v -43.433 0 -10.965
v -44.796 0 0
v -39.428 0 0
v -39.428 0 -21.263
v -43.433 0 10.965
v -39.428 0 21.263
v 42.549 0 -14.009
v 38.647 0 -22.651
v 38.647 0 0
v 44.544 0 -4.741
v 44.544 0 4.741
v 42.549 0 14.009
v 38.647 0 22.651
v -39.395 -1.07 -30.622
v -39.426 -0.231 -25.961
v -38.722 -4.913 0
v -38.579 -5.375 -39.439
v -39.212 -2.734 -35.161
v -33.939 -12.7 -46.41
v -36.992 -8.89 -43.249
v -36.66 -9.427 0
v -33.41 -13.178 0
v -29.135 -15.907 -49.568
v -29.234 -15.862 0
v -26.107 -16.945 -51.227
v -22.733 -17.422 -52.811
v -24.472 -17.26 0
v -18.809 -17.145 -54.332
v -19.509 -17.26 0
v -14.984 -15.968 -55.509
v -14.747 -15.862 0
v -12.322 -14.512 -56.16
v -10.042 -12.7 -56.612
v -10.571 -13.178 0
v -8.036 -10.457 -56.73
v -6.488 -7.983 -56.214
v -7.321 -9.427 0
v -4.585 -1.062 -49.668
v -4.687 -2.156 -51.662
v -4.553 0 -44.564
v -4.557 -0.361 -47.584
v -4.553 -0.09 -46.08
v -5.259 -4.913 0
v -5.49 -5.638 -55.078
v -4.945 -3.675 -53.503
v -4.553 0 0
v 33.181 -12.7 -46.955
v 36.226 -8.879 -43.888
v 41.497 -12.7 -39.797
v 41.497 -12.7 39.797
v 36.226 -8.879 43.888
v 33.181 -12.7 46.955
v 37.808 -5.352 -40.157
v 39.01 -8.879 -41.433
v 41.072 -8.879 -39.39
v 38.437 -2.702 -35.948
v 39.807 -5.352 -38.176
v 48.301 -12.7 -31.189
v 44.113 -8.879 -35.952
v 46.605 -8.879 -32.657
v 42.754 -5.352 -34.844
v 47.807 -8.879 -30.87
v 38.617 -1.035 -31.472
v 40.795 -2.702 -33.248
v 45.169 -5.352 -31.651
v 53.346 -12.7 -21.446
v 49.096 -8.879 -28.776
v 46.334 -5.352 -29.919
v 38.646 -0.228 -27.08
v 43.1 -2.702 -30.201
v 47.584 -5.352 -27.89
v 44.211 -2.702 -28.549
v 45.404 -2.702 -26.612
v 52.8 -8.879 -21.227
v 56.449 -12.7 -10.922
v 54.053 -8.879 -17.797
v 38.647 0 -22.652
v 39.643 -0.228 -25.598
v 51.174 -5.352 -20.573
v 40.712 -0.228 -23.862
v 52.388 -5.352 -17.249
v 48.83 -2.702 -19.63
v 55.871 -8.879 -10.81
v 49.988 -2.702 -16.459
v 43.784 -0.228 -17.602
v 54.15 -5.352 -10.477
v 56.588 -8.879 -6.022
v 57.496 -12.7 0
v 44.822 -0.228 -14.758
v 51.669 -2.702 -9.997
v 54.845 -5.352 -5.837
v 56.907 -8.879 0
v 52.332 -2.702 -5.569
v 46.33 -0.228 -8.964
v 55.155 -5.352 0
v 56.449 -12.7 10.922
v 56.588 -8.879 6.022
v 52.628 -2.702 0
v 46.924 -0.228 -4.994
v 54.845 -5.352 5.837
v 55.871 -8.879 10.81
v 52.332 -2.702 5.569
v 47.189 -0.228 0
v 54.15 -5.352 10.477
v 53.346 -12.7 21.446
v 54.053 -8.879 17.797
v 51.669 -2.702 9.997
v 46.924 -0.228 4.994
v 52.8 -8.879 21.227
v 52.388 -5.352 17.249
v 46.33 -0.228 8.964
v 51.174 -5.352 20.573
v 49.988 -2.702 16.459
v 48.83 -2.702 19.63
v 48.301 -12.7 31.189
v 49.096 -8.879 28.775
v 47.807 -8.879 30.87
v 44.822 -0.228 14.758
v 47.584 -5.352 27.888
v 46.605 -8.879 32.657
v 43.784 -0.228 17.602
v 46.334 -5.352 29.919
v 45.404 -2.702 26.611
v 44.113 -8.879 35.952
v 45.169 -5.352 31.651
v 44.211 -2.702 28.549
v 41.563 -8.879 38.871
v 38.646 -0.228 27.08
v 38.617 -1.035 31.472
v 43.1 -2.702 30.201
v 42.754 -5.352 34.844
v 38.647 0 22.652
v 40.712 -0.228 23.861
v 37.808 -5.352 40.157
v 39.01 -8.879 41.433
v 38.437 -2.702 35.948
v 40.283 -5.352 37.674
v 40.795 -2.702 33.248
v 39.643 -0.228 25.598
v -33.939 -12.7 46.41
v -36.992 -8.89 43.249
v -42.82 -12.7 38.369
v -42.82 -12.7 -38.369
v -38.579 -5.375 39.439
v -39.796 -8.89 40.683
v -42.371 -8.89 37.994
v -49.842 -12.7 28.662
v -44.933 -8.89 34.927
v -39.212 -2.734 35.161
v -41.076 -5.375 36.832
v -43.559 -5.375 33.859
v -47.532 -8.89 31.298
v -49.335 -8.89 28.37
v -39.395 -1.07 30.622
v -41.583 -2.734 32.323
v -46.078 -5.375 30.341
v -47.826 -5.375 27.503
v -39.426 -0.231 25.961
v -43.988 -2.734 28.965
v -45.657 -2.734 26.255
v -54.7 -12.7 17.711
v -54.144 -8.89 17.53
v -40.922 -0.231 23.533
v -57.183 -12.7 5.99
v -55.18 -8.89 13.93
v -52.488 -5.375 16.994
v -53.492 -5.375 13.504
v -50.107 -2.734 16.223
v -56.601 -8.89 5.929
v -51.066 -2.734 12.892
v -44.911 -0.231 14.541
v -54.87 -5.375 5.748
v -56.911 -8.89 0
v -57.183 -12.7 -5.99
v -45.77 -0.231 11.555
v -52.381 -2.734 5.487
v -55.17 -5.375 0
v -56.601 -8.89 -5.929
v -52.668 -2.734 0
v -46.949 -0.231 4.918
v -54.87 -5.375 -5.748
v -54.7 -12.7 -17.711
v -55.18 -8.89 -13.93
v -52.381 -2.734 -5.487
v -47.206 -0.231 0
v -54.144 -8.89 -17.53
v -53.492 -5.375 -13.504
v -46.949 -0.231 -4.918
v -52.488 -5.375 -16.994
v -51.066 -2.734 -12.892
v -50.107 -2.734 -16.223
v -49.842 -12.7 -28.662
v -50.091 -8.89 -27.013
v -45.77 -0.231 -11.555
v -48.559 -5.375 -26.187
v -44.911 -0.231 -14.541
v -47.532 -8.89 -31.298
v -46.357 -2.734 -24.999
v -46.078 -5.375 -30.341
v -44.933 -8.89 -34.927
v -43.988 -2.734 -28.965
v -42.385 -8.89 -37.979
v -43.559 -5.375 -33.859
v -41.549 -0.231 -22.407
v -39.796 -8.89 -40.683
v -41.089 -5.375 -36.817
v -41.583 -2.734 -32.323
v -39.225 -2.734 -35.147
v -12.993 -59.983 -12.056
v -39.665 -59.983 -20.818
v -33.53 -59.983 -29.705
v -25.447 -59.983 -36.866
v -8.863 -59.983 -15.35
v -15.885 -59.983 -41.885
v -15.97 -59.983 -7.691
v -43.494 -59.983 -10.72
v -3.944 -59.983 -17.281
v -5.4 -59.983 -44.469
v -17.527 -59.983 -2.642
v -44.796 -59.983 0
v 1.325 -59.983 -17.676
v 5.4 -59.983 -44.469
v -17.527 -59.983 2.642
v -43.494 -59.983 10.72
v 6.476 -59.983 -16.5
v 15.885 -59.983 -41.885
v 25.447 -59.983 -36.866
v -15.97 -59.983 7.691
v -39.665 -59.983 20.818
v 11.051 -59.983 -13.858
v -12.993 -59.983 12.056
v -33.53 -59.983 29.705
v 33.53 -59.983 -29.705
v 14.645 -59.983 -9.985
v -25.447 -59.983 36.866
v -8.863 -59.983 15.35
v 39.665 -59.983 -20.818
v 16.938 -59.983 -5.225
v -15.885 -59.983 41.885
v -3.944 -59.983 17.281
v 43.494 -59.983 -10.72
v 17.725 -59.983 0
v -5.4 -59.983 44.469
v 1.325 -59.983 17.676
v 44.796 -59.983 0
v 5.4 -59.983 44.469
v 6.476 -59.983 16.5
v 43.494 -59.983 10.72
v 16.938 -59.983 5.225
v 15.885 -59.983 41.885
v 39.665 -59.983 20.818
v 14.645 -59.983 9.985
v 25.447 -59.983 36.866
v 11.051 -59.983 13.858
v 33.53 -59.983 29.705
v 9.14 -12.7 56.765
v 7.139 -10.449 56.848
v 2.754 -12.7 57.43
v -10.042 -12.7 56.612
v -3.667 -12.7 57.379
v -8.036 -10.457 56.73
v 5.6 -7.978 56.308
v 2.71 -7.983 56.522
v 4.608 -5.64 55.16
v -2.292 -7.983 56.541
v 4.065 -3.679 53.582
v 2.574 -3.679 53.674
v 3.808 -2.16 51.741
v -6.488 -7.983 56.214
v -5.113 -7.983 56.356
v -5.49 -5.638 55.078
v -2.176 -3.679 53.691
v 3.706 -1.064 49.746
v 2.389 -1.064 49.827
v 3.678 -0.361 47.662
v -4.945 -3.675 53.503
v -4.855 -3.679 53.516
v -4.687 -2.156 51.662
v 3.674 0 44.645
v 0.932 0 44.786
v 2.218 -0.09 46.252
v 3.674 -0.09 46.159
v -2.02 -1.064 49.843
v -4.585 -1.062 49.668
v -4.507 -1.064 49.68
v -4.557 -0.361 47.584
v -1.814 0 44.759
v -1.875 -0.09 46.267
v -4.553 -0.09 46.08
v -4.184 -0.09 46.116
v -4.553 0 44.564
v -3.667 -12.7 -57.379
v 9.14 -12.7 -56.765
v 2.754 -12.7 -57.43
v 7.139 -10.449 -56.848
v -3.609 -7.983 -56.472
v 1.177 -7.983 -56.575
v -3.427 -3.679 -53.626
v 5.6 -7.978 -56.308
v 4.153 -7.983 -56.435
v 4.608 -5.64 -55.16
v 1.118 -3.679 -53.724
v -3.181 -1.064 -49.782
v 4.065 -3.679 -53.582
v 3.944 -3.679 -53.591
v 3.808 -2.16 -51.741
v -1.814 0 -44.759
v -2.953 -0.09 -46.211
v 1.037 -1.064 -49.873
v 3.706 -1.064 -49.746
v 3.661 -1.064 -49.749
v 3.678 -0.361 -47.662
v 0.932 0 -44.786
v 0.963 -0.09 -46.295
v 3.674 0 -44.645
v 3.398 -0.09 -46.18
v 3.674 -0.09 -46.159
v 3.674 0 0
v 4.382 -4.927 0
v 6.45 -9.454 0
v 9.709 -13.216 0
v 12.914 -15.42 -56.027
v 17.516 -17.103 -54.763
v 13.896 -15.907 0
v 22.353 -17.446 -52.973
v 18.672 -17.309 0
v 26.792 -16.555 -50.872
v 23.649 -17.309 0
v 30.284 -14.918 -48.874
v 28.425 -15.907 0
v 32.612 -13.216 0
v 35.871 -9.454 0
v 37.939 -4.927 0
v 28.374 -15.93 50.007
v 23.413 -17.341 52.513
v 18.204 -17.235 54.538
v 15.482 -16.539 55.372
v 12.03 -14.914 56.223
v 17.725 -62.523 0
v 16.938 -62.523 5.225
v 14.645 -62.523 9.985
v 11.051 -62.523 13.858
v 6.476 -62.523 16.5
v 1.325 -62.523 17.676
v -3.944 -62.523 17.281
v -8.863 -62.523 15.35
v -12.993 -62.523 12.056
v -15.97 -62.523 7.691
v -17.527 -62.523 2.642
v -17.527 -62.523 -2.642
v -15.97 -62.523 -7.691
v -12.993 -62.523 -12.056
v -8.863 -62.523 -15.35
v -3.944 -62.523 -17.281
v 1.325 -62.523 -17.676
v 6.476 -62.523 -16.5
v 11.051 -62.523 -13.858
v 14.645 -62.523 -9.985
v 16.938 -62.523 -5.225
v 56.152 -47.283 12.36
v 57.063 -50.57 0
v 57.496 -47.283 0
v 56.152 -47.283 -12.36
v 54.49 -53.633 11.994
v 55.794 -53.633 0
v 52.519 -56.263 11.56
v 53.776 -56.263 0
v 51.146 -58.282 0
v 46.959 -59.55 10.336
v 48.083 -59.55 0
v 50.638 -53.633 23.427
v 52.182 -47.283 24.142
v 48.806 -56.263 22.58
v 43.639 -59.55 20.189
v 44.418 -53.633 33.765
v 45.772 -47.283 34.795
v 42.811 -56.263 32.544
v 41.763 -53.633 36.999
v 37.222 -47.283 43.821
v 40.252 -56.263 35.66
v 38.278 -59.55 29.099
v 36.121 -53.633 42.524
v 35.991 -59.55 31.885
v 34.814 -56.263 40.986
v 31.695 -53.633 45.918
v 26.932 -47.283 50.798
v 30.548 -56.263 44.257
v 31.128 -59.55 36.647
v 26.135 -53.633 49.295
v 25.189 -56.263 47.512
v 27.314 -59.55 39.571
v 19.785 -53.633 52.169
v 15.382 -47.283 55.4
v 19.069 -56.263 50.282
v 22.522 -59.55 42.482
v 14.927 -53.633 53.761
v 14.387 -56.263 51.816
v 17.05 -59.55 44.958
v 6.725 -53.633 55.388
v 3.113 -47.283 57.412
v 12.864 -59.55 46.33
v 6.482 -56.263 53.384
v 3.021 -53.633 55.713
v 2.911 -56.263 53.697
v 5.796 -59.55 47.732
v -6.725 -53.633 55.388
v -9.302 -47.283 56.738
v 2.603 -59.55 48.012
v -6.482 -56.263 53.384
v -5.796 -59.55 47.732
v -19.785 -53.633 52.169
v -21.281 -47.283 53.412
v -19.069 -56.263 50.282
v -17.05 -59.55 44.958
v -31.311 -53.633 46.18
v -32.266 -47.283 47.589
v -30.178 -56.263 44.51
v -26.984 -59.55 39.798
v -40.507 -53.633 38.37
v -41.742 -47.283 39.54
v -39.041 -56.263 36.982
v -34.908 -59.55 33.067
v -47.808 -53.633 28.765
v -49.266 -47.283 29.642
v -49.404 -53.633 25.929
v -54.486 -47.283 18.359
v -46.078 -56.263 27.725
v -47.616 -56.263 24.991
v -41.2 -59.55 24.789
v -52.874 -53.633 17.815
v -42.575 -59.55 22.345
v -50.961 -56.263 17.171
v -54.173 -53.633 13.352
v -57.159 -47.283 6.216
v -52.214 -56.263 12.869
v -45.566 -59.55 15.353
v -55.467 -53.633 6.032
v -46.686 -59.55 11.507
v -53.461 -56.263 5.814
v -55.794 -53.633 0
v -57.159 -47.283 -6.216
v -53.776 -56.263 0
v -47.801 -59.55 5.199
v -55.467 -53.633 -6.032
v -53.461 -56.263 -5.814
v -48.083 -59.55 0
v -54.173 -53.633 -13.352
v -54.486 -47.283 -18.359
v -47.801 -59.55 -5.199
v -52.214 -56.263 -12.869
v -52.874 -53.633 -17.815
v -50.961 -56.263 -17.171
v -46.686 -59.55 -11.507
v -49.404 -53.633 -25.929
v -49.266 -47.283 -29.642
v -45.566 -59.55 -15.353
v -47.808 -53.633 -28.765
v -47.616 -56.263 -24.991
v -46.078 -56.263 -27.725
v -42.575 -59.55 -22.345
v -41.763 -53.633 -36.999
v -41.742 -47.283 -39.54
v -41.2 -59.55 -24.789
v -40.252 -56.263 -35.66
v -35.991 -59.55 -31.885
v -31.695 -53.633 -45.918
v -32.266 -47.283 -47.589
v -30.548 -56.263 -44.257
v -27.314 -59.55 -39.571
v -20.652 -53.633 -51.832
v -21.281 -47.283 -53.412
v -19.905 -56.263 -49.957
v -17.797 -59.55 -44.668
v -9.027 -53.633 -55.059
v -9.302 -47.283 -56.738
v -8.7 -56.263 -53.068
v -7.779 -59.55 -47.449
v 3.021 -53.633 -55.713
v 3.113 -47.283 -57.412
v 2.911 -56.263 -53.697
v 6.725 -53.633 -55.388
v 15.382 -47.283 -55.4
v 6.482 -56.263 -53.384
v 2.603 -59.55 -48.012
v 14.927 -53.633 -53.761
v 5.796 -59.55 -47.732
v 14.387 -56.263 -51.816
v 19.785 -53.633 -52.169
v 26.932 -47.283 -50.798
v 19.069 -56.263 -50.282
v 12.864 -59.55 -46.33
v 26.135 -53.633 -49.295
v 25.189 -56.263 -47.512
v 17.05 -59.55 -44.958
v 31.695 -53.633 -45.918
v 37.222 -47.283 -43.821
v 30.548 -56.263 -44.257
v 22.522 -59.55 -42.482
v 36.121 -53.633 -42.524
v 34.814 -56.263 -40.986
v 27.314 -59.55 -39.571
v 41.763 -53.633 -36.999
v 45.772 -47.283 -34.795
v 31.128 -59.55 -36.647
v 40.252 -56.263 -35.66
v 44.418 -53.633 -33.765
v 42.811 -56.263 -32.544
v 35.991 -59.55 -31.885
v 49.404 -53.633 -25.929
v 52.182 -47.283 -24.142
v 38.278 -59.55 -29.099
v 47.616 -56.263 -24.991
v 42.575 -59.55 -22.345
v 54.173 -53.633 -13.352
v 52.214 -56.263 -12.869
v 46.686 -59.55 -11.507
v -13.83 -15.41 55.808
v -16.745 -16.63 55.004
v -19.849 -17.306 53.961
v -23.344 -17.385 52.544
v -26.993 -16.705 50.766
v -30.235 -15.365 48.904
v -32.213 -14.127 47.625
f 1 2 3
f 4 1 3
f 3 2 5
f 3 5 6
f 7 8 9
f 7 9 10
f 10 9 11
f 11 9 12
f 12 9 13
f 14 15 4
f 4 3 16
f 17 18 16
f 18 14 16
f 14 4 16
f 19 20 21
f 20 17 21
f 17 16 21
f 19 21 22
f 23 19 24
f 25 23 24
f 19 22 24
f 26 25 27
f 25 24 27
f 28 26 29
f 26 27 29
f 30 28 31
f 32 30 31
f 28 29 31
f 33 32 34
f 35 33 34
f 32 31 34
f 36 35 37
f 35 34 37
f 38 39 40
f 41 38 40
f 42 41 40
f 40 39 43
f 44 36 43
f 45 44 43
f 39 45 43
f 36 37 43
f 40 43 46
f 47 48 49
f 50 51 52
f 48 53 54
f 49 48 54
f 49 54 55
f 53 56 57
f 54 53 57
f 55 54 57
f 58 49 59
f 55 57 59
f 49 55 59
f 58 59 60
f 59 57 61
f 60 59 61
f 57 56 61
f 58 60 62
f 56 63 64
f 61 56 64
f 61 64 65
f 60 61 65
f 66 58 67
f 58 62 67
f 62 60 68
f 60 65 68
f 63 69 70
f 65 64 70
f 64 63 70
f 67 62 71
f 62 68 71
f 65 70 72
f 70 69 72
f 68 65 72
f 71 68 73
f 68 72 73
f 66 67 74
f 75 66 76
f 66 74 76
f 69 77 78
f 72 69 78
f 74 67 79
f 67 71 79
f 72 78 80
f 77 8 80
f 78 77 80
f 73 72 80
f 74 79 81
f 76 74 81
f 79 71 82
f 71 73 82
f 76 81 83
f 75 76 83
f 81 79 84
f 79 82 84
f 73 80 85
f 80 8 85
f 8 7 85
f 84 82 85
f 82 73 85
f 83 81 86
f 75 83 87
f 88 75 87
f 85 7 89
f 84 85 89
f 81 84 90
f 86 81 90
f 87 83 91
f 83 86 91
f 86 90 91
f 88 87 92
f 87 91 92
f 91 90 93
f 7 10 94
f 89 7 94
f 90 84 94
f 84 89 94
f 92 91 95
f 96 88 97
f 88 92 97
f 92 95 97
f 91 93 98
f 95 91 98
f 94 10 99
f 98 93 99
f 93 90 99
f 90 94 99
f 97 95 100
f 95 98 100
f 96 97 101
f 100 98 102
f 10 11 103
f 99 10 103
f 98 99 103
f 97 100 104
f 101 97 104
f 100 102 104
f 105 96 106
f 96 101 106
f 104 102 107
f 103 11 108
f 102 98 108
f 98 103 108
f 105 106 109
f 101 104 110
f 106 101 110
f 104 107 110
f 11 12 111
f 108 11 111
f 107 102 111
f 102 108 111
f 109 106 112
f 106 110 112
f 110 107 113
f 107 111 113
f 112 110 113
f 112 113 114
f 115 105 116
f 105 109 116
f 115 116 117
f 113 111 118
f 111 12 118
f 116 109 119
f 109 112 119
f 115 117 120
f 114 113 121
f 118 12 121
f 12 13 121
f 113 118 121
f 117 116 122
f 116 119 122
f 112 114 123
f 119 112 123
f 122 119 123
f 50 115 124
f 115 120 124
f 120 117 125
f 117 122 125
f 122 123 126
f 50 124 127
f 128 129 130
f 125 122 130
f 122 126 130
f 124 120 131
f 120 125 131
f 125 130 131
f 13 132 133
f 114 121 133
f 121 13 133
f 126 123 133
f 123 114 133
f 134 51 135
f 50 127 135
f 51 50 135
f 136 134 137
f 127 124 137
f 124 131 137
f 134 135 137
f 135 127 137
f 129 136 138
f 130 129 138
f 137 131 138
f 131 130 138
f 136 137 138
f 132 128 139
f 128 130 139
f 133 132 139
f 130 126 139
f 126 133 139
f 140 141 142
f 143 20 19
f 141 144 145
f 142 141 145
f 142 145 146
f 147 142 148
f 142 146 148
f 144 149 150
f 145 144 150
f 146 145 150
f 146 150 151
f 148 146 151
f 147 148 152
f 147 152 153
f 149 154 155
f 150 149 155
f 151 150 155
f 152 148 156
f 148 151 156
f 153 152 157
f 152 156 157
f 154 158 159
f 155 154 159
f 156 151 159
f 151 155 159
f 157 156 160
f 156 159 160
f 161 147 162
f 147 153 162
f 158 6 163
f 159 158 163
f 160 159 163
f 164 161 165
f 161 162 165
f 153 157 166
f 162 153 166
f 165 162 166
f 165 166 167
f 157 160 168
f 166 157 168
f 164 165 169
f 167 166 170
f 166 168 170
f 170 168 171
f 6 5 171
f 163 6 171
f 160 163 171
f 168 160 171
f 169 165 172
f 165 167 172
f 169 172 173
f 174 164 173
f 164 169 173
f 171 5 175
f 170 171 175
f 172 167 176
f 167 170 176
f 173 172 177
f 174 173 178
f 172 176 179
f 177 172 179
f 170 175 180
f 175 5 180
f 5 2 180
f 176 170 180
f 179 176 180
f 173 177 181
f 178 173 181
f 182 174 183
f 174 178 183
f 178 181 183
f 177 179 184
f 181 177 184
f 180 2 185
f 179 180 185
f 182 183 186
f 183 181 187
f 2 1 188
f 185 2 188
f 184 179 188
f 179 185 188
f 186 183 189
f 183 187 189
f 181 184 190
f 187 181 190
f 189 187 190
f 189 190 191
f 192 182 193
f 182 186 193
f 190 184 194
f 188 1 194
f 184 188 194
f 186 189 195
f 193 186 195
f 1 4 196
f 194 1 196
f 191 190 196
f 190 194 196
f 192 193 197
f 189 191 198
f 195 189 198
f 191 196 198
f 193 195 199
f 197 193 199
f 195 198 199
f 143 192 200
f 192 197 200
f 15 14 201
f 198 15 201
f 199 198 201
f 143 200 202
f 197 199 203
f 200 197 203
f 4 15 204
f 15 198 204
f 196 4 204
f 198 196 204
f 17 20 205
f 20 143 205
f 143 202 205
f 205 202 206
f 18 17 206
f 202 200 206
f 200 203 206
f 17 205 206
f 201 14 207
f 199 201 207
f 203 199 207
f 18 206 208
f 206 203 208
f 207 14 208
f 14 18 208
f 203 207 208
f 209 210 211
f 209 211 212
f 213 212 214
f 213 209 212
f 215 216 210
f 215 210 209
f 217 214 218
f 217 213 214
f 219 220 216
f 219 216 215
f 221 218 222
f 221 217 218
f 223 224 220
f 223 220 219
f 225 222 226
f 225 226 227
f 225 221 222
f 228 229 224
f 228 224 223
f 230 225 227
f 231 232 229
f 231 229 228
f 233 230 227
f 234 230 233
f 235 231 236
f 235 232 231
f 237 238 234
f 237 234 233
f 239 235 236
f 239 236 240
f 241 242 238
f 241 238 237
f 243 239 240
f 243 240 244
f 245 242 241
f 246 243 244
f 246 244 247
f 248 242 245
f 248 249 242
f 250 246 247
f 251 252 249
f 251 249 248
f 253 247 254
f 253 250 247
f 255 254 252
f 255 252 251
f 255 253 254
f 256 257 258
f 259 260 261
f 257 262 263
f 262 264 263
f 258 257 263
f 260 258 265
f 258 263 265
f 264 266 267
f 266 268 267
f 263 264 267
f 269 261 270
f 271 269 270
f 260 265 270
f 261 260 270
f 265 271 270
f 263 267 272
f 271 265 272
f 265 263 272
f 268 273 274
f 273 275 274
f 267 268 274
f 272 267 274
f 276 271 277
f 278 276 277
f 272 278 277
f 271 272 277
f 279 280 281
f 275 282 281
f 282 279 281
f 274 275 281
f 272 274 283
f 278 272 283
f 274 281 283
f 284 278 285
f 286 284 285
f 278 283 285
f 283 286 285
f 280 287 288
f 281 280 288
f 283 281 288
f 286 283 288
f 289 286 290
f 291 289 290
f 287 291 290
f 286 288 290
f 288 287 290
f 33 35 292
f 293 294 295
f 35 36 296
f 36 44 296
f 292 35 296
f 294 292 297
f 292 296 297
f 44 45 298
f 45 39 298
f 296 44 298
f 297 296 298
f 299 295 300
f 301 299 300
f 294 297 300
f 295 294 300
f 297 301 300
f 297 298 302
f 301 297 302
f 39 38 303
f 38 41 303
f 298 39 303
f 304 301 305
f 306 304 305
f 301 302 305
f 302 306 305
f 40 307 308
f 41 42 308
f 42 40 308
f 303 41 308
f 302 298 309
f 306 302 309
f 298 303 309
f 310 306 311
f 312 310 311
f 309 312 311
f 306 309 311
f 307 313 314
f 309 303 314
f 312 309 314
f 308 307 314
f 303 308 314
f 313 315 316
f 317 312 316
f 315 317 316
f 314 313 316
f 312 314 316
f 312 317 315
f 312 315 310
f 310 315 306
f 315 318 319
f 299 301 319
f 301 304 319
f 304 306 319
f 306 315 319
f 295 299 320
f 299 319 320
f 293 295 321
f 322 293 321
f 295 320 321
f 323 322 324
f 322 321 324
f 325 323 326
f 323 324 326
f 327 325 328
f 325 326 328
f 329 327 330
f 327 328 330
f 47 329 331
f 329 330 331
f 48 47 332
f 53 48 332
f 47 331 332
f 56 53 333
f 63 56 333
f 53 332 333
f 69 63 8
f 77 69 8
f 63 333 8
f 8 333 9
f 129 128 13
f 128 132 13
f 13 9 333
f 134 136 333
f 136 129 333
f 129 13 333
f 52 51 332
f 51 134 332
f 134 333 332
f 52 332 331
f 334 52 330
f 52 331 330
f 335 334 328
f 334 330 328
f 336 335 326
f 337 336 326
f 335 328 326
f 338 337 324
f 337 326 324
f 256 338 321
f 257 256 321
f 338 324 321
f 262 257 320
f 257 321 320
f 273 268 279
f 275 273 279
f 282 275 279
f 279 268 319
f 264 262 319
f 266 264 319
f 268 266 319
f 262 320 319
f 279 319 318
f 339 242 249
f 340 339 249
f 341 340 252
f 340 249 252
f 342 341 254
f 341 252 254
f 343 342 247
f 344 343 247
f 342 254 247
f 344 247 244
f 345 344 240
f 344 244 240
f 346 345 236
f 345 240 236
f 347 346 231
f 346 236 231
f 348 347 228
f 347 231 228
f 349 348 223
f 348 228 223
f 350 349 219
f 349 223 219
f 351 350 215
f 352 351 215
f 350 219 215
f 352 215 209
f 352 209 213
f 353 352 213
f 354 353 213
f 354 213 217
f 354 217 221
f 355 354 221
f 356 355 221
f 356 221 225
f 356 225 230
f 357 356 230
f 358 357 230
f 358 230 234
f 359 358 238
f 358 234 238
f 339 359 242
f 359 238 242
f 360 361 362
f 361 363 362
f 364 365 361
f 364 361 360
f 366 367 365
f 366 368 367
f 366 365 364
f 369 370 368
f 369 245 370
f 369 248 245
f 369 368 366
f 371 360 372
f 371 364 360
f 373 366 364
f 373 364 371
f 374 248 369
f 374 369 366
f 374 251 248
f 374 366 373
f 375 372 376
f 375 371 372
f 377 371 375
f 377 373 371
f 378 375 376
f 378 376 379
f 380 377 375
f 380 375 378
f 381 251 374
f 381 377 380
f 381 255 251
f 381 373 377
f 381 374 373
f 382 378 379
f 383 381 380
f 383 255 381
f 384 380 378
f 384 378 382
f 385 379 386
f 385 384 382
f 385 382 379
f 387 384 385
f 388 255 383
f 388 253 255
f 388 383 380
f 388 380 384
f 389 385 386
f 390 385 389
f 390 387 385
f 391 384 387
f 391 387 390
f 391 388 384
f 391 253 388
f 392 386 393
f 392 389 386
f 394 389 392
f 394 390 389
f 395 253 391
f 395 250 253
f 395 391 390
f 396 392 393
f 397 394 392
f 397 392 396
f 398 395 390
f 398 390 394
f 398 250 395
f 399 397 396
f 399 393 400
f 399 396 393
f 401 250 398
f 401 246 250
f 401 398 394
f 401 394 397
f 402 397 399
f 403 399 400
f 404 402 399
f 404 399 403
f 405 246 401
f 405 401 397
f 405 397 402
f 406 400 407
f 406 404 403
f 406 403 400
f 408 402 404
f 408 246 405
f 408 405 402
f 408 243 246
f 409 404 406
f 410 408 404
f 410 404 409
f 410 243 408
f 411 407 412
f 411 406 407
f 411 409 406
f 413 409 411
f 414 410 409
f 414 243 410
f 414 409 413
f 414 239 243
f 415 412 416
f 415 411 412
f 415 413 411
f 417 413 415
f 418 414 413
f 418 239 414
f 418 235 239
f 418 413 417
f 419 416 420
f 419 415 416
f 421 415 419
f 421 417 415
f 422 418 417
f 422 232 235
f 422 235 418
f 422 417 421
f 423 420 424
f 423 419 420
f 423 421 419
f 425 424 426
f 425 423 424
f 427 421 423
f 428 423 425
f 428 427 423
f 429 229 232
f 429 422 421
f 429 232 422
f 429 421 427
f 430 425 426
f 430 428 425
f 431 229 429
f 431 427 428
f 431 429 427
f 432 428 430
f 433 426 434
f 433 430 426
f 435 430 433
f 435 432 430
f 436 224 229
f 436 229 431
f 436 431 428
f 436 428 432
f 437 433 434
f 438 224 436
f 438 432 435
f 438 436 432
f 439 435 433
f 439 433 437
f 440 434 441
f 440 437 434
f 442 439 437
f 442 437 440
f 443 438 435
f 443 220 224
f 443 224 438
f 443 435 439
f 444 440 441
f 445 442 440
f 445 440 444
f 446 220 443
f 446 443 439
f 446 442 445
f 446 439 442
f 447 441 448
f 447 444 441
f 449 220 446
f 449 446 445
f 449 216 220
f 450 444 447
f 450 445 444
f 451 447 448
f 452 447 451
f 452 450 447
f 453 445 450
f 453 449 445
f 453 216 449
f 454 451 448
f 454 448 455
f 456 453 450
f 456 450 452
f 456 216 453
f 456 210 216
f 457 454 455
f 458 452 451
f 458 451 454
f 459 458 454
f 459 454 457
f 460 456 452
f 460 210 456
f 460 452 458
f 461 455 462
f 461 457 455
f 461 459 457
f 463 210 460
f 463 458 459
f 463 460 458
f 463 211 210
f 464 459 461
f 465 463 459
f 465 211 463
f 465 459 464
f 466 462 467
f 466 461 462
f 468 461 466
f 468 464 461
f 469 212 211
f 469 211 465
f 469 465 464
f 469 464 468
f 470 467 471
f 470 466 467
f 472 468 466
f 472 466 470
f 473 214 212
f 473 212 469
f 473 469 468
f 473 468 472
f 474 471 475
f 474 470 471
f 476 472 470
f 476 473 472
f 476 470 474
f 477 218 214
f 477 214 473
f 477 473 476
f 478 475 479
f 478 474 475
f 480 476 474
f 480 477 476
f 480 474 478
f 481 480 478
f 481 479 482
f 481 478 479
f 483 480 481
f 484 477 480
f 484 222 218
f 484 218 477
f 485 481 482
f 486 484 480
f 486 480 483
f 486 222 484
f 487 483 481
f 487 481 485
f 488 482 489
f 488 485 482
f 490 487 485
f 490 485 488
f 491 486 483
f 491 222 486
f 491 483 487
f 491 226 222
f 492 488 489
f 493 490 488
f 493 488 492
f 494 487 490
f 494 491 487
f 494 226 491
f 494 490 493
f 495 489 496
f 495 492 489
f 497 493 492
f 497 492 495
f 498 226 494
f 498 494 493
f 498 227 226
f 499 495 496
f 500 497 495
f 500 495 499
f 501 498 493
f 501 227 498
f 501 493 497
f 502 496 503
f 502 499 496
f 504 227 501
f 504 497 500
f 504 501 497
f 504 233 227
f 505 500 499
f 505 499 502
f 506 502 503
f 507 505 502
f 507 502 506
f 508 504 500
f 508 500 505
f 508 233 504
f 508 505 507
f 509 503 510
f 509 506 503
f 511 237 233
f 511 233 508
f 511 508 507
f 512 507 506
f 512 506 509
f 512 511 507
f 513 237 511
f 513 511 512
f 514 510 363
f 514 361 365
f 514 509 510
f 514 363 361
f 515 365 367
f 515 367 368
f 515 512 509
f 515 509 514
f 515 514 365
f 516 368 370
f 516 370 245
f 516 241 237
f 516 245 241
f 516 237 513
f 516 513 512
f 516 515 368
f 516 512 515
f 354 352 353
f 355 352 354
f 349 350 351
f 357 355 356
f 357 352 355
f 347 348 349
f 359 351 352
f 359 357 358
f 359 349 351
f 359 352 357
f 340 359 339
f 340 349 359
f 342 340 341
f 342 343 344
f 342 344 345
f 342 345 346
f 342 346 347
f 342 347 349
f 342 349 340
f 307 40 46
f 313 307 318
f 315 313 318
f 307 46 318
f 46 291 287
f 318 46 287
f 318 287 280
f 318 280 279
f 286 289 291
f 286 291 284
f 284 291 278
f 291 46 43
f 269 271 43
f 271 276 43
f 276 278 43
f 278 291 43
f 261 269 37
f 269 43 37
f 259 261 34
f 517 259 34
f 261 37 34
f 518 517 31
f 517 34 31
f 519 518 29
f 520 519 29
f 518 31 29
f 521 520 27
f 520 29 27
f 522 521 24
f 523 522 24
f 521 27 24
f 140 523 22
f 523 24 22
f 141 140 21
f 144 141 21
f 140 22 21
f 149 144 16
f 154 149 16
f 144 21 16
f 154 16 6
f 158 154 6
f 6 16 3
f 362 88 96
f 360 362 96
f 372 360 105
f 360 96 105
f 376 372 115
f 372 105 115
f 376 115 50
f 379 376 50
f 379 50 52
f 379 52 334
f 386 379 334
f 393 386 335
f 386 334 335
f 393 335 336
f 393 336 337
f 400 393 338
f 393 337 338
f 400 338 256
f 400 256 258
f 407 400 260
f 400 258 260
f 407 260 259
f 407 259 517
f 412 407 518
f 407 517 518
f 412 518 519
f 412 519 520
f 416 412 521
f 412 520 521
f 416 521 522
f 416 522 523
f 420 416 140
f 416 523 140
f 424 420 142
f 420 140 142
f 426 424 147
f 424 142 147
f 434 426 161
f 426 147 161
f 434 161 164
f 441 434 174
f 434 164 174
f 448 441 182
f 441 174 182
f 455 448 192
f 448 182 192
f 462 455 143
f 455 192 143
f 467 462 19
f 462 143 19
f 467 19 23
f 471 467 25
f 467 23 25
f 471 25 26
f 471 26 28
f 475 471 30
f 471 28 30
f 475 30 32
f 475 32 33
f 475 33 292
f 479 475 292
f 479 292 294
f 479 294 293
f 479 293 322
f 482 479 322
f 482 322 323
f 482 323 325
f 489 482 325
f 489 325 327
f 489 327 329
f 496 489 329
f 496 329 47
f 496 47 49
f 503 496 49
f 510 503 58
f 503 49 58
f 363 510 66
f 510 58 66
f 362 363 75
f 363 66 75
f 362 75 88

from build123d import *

# Parameters (mm, degrees)
F0_R      = 57.495906
F1_DEPTH  = 59.983172
F2_R      = 12.7
F3_R      = 12.7
F4_R      = 17.725116
F5_DEPTH  = 2.54
F6_R      = 17.48679
F8_DEPTH  = 68.421327
F7_R      = 17.437496
F9_DEPTH  = 79.699665
F11_DEPTH = 109.126121


with BuildPart() as f1:
    # F0 (on Front) → F1 (new body)
    with BuildSketch(Plane.XZ):
        Circle(F0_R)
    extrude(amount=F1_DEPTH)

    # F2
    f2_edges = [f1.edges().sort_by_distance(p)[0] for p in [
        (-57.495906, -59.983172, 0),
    ]]
    fillet(f2_edges, radius=F2_R)

    # F3
    f3_edges = [f1.edges().sort_by_distance(p)[0] for p in [
        (-57.495906, 0, 0),
    ]]
    fillet(f3_edges, radius=F3_R)

    # F4 (on face) → F5 (join)
    with BuildSketch(Plane.XZ.offset(59.983172)):
        Circle(F4_R)
    extrude(amount=F5_DEPTH)

    # F6 (on Top) → F8 (cut)
    with BuildSketch(Plane.XY):
        with Locations((21.160603, 0)):
            Circle(F6_R)
    extrude(amount=-F8_DEPTH, mode=Mode.SUBTRACT)

    # F7 (on Top) → F9 (cut)
    with BuildSketch(Plane.XY):
        with Locations((-21.990493, 0)):
            Circle(F7_R)
    extrude(amount=-F9_DEPTH, mode=Mode.SUBTRACT)

    # F9_face (on face) + F8_face (on face) → F11 (cut)
    with BuildSketch(Plane(origin=(-21.990493, -7.400703, 0), x_dir=(1, 0, 0), z_dir=(0, 0, -1))):
        with BuildLine():
            ThreePointArc((17.437496, -7.400703), (0, 10.036793), (-17.437496, -7.400703))
            Line((-17.437496, -7.400703), (17.437496, -7.400703))
        make_face()
    with BuildSketch(Plane(origin=(21.160603, -7.421624, 0), x_dir=(1, 0, 0), z_dir=(0, 0, -1))):
        with BuildLine():
            ThreePointArc((17.48679, -7.421624), (0, 10.065166), (-17.48679, -7.421624))
            Line((-17.48679, -7.421624), (17.48679, -7.421624))
        make_face()
    extrude(amount=-F11_DEPTH, mode=Mode.SUBTRACT)


solid = f1.part
